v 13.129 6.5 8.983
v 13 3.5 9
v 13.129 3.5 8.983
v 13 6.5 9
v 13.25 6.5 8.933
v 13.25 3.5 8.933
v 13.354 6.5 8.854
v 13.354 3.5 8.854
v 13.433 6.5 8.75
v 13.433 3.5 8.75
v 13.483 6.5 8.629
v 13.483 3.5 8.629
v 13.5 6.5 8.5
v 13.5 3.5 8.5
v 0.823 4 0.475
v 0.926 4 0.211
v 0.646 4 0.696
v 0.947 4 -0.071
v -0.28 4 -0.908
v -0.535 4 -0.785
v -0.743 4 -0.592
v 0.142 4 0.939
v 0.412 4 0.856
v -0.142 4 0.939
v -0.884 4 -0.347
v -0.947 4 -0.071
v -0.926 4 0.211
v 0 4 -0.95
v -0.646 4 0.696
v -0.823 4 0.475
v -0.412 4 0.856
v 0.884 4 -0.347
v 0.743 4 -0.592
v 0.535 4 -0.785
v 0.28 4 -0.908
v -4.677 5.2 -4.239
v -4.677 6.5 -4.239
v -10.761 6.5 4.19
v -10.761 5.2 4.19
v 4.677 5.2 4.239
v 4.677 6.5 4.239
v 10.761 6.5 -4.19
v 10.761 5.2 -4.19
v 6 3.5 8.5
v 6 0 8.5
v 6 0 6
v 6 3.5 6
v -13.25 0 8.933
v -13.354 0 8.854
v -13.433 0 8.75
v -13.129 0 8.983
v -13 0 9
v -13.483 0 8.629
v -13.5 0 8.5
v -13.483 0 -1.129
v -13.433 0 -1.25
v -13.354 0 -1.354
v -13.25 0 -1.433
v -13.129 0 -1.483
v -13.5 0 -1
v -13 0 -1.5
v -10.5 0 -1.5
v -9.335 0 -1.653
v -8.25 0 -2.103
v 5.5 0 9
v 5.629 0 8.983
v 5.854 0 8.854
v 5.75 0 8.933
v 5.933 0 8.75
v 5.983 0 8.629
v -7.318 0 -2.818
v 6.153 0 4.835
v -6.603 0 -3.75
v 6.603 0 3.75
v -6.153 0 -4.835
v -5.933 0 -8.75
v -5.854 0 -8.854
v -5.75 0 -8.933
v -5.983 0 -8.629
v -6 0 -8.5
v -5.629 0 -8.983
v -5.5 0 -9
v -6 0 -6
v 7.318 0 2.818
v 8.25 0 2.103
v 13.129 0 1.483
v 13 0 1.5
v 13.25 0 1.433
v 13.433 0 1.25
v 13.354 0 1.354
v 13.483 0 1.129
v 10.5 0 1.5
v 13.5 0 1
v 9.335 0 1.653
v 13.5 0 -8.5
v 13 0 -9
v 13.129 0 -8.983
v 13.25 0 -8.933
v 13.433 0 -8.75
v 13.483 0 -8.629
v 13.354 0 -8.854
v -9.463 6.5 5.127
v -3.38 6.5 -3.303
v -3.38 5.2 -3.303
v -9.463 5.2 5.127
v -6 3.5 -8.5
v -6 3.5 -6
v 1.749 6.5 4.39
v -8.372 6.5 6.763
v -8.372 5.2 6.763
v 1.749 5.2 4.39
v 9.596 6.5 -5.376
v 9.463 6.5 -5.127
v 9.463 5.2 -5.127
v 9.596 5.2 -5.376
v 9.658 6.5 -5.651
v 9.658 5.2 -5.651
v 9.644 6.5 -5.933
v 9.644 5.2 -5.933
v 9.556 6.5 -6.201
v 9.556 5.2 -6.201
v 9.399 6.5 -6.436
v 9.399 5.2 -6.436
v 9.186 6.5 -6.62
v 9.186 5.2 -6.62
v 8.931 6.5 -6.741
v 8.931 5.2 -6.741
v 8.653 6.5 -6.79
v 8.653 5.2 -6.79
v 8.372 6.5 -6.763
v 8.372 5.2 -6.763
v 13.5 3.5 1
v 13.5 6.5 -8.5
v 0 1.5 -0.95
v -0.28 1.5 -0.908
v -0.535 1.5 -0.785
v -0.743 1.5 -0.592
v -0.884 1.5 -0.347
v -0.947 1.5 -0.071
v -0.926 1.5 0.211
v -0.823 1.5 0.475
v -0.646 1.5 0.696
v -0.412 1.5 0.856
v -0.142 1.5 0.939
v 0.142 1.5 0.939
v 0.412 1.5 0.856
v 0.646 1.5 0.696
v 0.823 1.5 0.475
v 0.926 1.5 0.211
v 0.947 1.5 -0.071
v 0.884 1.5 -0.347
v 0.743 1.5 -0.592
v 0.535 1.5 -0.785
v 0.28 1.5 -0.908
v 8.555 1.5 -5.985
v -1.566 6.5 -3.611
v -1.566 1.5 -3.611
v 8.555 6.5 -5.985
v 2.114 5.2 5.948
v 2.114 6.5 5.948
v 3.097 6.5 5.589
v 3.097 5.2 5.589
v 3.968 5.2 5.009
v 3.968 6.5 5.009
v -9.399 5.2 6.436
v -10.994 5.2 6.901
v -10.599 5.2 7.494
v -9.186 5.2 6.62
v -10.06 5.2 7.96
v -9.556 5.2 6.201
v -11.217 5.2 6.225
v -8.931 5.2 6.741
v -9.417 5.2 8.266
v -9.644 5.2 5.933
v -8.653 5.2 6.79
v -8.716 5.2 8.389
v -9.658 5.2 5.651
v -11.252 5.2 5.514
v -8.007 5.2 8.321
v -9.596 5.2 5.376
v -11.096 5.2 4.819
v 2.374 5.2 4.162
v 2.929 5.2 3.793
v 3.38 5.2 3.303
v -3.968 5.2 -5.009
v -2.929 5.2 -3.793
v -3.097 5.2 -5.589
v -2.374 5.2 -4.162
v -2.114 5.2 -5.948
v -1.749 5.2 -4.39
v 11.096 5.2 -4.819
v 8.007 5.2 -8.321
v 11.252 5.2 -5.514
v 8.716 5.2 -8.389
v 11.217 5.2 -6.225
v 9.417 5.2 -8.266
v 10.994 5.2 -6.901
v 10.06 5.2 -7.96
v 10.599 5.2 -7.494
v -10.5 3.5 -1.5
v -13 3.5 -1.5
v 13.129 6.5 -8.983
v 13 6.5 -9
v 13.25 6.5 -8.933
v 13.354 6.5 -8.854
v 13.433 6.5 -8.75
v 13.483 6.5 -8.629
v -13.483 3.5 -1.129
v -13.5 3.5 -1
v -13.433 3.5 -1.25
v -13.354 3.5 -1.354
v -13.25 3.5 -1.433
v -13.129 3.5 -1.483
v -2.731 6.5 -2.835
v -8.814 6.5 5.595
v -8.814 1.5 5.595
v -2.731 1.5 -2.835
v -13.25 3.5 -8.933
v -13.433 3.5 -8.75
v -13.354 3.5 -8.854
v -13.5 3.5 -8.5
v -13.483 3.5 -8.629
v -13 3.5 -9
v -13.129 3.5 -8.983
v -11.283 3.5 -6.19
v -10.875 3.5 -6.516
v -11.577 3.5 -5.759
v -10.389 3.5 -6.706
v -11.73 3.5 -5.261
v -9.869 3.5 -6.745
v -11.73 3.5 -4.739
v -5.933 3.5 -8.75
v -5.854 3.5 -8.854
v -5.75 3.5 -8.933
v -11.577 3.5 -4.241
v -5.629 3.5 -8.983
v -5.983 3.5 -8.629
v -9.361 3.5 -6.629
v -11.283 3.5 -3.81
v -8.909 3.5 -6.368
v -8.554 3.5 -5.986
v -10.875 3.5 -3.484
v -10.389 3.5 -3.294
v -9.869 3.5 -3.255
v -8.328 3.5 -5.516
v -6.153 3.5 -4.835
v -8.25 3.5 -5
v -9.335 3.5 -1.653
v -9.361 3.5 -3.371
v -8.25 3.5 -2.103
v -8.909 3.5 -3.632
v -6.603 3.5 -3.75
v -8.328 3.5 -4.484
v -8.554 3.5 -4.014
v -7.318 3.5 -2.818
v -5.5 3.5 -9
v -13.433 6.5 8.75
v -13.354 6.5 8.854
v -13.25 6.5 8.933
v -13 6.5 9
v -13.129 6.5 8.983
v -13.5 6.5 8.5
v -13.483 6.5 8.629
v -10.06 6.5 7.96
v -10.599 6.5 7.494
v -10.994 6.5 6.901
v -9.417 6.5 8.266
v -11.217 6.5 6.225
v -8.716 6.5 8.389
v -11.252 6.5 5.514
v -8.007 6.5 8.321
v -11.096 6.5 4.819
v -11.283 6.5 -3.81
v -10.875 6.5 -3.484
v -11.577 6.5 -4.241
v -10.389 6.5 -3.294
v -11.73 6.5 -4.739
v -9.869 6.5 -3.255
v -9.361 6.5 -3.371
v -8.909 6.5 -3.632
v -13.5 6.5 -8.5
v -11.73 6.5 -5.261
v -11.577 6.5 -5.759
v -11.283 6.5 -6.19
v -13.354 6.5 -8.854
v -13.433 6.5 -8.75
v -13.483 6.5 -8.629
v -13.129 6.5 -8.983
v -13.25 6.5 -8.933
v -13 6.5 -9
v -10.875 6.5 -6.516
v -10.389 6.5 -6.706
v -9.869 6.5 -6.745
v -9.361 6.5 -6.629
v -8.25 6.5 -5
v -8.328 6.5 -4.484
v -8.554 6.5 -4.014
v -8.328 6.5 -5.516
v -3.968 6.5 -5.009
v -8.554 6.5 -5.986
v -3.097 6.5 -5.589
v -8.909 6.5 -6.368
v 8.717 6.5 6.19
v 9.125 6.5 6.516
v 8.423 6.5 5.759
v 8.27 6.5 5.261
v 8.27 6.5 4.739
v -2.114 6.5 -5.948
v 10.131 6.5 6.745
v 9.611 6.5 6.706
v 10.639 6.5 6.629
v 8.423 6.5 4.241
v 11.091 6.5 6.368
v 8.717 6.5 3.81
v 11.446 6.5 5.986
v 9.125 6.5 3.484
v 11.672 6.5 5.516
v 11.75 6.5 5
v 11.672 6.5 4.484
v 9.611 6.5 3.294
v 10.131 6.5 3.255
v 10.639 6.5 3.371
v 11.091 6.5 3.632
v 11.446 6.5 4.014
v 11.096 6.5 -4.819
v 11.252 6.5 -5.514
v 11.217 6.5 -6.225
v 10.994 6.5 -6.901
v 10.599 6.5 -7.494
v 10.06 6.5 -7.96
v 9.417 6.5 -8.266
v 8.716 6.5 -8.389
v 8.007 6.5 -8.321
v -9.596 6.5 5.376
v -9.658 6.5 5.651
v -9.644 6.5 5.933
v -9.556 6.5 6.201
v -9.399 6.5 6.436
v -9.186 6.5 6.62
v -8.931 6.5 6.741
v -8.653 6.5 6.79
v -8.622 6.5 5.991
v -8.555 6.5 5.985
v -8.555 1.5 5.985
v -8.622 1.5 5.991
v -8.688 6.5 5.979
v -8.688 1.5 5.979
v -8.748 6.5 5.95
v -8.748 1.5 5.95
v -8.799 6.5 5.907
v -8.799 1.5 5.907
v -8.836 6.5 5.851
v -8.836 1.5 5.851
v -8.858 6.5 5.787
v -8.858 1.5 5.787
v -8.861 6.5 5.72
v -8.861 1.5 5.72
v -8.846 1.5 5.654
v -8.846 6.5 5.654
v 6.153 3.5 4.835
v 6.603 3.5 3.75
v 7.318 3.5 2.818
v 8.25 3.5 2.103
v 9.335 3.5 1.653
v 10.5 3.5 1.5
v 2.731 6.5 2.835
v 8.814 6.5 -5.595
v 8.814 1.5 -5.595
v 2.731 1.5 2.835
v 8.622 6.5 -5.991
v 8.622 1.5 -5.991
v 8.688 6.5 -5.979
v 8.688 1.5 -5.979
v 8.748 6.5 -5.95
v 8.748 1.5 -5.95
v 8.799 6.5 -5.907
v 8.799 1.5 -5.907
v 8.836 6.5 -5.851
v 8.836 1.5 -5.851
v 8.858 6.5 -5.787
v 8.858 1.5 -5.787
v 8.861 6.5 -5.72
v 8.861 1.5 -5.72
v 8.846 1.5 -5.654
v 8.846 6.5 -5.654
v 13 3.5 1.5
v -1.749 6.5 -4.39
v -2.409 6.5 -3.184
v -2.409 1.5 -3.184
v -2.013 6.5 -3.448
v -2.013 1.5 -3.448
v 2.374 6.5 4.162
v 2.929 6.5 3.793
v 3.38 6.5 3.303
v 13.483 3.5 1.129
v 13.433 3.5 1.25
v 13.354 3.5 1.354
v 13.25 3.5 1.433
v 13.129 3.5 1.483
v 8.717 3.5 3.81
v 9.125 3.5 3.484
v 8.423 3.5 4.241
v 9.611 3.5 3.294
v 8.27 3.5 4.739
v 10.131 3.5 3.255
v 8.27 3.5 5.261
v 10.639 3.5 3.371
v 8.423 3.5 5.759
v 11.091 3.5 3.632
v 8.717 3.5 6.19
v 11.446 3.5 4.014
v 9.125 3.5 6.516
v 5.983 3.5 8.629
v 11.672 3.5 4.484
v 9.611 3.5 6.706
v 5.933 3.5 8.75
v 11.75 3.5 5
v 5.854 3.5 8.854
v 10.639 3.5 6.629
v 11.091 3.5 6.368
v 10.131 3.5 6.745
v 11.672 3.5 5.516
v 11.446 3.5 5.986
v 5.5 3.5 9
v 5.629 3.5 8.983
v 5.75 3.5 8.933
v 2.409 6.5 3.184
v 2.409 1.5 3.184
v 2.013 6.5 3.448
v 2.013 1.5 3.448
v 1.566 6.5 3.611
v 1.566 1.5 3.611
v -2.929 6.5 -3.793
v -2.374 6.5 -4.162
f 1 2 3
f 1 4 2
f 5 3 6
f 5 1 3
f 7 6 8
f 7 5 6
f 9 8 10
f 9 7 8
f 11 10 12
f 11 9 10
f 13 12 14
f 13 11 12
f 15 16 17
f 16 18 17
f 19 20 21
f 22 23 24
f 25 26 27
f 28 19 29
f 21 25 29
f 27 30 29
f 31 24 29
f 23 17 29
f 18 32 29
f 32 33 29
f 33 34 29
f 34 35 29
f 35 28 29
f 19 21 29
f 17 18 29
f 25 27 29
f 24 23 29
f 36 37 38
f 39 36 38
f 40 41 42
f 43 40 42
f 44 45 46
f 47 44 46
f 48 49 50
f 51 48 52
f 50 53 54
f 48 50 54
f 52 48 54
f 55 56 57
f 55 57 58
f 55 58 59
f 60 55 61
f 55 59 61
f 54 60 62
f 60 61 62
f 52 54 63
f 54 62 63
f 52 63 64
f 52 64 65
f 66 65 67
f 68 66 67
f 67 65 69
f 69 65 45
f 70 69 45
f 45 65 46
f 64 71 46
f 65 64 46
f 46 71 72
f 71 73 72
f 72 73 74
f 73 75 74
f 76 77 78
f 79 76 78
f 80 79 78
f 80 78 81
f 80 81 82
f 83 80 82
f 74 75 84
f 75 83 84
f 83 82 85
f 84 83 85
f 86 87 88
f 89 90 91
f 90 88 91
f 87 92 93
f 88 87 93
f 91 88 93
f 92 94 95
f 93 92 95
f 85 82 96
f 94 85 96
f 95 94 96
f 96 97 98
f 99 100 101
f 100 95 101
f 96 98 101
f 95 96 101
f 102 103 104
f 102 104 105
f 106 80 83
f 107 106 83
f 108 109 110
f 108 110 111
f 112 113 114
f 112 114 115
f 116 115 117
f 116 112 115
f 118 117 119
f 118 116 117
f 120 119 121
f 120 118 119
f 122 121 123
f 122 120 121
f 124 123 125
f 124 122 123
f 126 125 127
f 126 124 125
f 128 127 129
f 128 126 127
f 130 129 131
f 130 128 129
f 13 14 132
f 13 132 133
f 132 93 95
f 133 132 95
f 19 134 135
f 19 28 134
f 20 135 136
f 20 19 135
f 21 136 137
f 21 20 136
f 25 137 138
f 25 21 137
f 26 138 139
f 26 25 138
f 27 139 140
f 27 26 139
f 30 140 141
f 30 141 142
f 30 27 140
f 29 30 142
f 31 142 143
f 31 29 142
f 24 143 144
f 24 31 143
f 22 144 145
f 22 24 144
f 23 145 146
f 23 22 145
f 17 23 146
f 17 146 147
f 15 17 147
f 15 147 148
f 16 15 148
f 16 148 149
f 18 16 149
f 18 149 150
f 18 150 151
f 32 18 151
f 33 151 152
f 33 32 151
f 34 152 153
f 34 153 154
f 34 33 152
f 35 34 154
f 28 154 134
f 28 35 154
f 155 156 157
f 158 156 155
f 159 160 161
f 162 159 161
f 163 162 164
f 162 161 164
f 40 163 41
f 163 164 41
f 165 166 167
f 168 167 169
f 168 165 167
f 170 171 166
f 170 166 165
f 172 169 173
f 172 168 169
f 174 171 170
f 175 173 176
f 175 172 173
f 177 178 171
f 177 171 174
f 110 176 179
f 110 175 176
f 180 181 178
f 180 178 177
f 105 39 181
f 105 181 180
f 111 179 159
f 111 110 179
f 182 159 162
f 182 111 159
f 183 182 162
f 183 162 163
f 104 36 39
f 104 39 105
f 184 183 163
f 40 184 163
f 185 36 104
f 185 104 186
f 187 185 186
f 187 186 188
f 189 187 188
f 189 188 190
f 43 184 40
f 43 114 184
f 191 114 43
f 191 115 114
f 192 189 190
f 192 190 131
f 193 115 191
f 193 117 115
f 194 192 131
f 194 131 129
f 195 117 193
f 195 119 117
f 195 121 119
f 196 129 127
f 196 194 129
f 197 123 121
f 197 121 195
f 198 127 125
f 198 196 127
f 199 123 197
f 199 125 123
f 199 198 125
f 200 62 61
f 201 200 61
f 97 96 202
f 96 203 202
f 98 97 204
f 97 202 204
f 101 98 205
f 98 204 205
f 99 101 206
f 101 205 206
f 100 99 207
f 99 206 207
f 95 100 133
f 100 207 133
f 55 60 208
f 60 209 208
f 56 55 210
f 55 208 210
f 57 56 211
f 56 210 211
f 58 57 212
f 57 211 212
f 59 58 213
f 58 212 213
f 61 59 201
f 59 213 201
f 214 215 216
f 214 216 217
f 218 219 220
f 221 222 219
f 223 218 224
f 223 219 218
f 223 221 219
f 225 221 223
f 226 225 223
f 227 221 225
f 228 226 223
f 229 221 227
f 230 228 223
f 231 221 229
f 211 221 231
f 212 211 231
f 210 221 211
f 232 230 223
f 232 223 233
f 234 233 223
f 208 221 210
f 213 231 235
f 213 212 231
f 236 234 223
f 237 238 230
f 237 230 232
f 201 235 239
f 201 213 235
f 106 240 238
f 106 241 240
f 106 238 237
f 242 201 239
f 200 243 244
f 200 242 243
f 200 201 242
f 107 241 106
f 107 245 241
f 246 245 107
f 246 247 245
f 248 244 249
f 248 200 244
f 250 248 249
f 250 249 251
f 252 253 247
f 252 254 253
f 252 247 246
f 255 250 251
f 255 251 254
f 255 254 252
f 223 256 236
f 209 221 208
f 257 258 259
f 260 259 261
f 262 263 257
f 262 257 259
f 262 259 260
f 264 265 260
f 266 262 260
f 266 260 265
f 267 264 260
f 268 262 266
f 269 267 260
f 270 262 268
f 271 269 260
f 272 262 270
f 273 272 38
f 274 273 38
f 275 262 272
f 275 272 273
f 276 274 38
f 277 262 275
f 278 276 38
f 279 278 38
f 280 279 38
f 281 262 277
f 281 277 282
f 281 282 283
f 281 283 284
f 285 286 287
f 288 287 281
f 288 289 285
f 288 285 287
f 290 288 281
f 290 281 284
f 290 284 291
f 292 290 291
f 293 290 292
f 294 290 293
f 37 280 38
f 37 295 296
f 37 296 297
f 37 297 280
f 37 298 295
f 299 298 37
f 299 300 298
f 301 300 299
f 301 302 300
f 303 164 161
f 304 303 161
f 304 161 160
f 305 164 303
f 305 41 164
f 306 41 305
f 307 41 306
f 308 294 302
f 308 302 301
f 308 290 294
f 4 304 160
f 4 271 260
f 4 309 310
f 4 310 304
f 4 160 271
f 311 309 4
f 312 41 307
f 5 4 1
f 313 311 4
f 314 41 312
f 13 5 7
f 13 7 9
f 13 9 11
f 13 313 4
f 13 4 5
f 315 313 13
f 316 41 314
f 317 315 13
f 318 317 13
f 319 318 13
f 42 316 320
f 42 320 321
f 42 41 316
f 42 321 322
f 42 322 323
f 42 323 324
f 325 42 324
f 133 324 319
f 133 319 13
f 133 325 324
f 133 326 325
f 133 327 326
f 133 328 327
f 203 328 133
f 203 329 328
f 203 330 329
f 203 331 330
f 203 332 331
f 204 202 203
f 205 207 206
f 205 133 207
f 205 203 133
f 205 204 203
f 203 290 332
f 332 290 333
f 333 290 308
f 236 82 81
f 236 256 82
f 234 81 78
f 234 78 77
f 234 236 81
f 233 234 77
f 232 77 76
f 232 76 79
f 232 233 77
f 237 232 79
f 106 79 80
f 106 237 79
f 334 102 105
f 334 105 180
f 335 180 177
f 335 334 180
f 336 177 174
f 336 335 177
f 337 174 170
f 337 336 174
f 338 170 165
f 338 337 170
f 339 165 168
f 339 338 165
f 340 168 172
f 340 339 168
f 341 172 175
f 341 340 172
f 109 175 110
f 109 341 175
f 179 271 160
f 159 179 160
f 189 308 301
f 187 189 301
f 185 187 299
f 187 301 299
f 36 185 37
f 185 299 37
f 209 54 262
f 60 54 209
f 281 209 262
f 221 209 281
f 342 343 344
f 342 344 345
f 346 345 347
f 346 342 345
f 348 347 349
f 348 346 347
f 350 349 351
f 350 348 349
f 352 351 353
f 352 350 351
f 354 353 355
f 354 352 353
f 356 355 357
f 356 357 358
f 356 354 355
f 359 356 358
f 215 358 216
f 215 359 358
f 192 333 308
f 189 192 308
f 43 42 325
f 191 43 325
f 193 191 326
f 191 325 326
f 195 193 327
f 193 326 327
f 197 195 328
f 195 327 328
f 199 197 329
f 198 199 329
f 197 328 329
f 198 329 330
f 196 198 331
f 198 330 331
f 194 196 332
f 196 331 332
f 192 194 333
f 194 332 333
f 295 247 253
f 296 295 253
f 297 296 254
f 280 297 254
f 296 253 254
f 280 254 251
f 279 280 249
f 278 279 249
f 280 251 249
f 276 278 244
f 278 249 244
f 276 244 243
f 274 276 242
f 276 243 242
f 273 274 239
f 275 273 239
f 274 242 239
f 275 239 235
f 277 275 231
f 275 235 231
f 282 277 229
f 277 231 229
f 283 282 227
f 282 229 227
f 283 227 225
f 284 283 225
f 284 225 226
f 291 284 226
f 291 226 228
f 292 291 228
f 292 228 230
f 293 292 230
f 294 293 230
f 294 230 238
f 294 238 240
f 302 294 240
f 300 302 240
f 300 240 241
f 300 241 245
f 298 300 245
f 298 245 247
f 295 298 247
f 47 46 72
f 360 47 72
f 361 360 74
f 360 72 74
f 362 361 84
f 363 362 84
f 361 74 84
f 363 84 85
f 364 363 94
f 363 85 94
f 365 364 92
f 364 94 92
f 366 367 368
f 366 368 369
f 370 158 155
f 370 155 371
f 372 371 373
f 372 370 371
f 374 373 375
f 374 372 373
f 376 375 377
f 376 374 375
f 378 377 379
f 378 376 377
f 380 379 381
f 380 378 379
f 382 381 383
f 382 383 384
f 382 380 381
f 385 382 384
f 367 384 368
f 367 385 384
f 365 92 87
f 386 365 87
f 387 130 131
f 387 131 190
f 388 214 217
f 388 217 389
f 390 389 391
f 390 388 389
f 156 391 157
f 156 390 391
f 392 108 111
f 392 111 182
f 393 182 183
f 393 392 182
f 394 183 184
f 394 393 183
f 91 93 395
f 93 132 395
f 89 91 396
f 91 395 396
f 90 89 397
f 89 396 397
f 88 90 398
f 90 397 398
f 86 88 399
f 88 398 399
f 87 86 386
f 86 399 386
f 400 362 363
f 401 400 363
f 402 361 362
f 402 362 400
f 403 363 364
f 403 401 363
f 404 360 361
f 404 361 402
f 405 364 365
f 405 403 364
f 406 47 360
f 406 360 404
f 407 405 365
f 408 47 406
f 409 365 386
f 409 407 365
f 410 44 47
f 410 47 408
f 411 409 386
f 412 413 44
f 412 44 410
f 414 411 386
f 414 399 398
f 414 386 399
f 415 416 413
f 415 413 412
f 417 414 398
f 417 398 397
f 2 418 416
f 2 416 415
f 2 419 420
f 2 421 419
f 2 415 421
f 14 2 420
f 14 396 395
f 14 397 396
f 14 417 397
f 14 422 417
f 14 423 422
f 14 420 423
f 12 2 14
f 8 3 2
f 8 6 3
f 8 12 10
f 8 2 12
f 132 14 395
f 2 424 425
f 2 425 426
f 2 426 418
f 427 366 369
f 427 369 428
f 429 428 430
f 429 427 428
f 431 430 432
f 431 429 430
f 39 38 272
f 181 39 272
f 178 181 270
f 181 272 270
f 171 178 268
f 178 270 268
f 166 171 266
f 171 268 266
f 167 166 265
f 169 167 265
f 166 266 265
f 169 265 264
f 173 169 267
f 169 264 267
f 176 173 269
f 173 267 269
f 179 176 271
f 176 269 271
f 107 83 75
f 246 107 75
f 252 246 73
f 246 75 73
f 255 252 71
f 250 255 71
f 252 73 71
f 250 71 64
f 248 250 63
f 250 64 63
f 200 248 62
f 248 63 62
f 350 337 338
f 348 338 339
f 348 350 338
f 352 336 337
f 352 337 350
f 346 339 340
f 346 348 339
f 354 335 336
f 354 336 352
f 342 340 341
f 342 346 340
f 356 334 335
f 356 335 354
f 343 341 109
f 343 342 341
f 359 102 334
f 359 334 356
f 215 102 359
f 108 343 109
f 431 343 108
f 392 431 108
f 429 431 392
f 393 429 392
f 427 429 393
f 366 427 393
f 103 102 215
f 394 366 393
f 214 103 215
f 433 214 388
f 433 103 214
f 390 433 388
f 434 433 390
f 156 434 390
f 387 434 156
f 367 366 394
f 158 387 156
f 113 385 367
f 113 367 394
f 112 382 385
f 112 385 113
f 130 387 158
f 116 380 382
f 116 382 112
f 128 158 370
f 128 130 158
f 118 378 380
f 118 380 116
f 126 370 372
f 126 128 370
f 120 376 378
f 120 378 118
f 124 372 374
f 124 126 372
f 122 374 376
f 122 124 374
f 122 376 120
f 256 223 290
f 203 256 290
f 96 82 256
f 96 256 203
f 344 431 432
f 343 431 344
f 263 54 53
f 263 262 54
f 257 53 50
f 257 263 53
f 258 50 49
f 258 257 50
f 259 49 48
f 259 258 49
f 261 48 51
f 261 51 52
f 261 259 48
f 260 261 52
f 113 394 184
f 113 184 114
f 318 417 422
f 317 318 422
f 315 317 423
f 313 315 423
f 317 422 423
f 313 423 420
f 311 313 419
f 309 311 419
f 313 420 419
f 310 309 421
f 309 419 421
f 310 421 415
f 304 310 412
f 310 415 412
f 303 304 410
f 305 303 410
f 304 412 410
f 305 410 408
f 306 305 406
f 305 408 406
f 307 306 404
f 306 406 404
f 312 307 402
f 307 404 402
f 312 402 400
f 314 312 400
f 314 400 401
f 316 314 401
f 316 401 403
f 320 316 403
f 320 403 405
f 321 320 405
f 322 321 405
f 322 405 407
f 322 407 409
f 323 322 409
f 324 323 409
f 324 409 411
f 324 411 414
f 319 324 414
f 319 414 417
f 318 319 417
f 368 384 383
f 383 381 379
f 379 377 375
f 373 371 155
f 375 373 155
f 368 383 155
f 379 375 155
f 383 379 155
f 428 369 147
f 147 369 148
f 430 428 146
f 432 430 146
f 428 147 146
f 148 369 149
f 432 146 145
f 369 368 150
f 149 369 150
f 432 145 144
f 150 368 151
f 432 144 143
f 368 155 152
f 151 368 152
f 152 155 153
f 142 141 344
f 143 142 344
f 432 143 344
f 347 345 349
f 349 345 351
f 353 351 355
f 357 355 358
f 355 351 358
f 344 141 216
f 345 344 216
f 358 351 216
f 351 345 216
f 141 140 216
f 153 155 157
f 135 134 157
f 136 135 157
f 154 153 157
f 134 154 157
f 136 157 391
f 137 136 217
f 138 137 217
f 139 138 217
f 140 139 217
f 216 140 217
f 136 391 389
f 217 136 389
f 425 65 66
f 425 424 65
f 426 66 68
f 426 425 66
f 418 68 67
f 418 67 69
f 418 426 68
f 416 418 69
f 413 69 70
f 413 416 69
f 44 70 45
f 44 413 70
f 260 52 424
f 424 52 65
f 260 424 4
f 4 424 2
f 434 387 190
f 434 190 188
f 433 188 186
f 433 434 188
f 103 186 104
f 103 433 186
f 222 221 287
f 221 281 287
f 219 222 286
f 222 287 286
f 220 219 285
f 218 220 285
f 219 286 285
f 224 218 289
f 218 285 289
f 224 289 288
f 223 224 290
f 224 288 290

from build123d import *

# Parameters (mm, degrees)
BASES_W                = 27
BASES_H                = 18
BASE_DEPTH             = 6.5
DIAMONDCUT_DEPTH       = 5
O_RINGPROFILE_DEPTH    = 1.3
SPRINGRETENTIONS_W     = 0.95
SPRINGRETENTIONS_H     = 2.5
M3_CLEARANCE_HOLE1_D   = 3.5
MOUNTINGHOLECUTS_DEPTH = 3.5
BASEF_R                = 0.5


with BuildPart() as part:
    # BaseS → Base (new body)
    with BuildSketch(Plane(origin=(0, 0, 0), x_dir=(1, 0, 0), z_dir=(0, 1, 0))):
        Rectangle(BASES_W, BASES_H)
    extrude(amount=BASE_DEPTH)

    # DiamondCutS → DiamondCut (cut)
    with BuildSketch(Plane(origin=(0, 6.5, 0), x_dir=(1, 0, 0), z_dir=(0, 1, 0))):
        with BuildLine():
            Line((-1.566008472, 3.61128036), (8.554644537, 5.984544502))
            ThreePointArc((8.554644537, 5.984544502), (8.81973312, 5.87982208), (8.814442824, 5.594847071))
            Line((8.814442824, 5.594847071), (2.731178612, -2.834500266))
            ThreePointArc((2.731178612, -2.834500266), (2.218800785, -3.328201177), (1.566008472, -3.61128036))
            Line((1.566008472, -3.61128036), (-8.554644537, -5.984544502))
            ThreePointArc((-8.554644537, -5.984544502), (-8.81973312, -5.87982208), (-8.814442824, -5.594847071))
            Line((-8.814442824, -5.594847071), (-2.731178612, 2.834500266))
            ThreePointArc((-2.731178612, 2.834500266), (-2.218800785, 3.328201177), (-1.566008472, 3.61128036))
        make_face()
    extrude(amount=-DIAMONDCUT_DEPTH, mode=Mode.SUBTRACT)

    # O-RingProfileS → O-RingProfile (cut)
    with BuildSketch(Plane(origin=(0, 6.5, 0), x_dir=(1, 0, 0), z_dir=(0, 1, 0))):
        with BuildLine():
            Line((4.677312477, -4.238979879), (10.760576688, 4.190367458))
            ThreePointArc((10.760576688, 4.190367458), (10.816653826, 7.211102551), (8.006714841, 8.321160228))
            Line((8.006714841, 8.321160228), (-2.113938167, 5.947896086))
            ThreePointArc((-2.113938167, 5.947896086), (-3.550081256, 5.325121884), (-4.677312477, 4.238979879))
            Line((-4.677312477, 4.238979879), (-10.760576688, -4.190367458))
            ThreePointArc((-10.760576688, -4.190367458), (-10.816653826, -7.211102551), (-8.006714841, -8.321160228))
            Line((-8.006714841, -8.321160228), (2.113938167, -5.947896086))
            ThreePointArc((2.113938167, -5.947896086), (3.550081256, -5.325121884), (4.677312477, -4.238979879))
        make_face()
        with BuildLine():
            Line((3.379889901, -3.302660137), (9.463154112, 5.1266872))
            ThreePointArc((9.463154112, 5.1266872), (9.485373355, 6.323582237), (8.372001305, 6.763416411))
            Line((8.372001305, 6.763416411), (-1.748651703, 4.390152269))
            ThreePointArc((-1.748651703, 4.390152269), (-2.662560942, 3.993841413), (-3.379889901, 3.302660137))
            Line((-3.379889901, 3.302660137), (-9.463154112, -5.1266872))
            ThreePointArc((-9.463154112, -5.1266872), (-9.485373355, -6.323582237), (-8.372001305, -6.763416411))
            Line((-8.372001305, -6.763416411), (1.748651703, -4.390152269))
            ThreePointArc((1.748651703, -4.390152269), (2.662560942, -3.993841413), (3.379889901, -3.302660137))
        make_face(mode=Mode.SUBTRACT)
    extrude(amount=-O_RINGPROFILE_DEPTH, mode=Mode.SUBTRACT)

    # SpringRetentionS → SpringRetention (revolve)
    with BuildSketch(Plane(origin=(0, 0, 0), x_dir=(0, 0, -1), z_dir=(1, 0, 0))):
        with Locations((0.475, 2.75)):
            Rectangle(SPRINGRETENTIONS_W, SPRINGRETENTIONS_H)
    revolve(axis=Axis((0, 1.5, 0), (0, 1, 0)))

    # M3 Clearance Hole1 (through all)
    with Locations(Plane(origin=(0, 6.5, 0), x_dir=(-1, 0, 0), z_dir=(0, 1, 0))):
        with Locations((10, -5), (-10, 5)):
            Hole(M3_CLEARANCE_HOLE1_D / 2)

    # MountingHoleCutsS → MountingHoleCuts (cut)
    with BuildSketch(Plane.XZ):
        with BuildLine():
            Line((13.5, 1.5), (13.5, 9))
            Line((13.5, 9), (6, 9))
            Line((6, 9), (6, 6))
            ThreePointArc((6, 6), (7.318019485, 2.818019485), (10.5, 1.5))
            Line((10.5, 1.5), (13.5, 1.5))
        make_face()
        with BuildLine():
            Line((-13.5, -9), (-6, -9))
            Line((-6, -9), (-6, -6))
            ThreePointArc((-6, -6), (-7.318019485, -2.818019485), (-10.5, -1.5))
            Line((-10.5, -1.5), (-13.5, -1.5))
            Line((-13.5, -1.5), (-13.5, -9))
        make_face()
    extrude(amount=-MOUNTINGHOLECUTS_DEPTH, mode=Mode.SUBTRACT)

    # BaseF
    basef_edges = [part.edges().sort_by_distance(p)[0] for p in [
        (-6, 1.75, -9),
        (-13.5, 1.75, -1.5),
        (6, 1.75, 9),
        (13.5, 1.75, 1.5),
        (13.5, 5, 9),
        (-13.5, 3.25, 9),
        (-13.5, 5, -9),
        (13.5, 3.25, -9),
    ]]
    fillet(basef_edges, radius=BASEF_R)


solid = part.part
